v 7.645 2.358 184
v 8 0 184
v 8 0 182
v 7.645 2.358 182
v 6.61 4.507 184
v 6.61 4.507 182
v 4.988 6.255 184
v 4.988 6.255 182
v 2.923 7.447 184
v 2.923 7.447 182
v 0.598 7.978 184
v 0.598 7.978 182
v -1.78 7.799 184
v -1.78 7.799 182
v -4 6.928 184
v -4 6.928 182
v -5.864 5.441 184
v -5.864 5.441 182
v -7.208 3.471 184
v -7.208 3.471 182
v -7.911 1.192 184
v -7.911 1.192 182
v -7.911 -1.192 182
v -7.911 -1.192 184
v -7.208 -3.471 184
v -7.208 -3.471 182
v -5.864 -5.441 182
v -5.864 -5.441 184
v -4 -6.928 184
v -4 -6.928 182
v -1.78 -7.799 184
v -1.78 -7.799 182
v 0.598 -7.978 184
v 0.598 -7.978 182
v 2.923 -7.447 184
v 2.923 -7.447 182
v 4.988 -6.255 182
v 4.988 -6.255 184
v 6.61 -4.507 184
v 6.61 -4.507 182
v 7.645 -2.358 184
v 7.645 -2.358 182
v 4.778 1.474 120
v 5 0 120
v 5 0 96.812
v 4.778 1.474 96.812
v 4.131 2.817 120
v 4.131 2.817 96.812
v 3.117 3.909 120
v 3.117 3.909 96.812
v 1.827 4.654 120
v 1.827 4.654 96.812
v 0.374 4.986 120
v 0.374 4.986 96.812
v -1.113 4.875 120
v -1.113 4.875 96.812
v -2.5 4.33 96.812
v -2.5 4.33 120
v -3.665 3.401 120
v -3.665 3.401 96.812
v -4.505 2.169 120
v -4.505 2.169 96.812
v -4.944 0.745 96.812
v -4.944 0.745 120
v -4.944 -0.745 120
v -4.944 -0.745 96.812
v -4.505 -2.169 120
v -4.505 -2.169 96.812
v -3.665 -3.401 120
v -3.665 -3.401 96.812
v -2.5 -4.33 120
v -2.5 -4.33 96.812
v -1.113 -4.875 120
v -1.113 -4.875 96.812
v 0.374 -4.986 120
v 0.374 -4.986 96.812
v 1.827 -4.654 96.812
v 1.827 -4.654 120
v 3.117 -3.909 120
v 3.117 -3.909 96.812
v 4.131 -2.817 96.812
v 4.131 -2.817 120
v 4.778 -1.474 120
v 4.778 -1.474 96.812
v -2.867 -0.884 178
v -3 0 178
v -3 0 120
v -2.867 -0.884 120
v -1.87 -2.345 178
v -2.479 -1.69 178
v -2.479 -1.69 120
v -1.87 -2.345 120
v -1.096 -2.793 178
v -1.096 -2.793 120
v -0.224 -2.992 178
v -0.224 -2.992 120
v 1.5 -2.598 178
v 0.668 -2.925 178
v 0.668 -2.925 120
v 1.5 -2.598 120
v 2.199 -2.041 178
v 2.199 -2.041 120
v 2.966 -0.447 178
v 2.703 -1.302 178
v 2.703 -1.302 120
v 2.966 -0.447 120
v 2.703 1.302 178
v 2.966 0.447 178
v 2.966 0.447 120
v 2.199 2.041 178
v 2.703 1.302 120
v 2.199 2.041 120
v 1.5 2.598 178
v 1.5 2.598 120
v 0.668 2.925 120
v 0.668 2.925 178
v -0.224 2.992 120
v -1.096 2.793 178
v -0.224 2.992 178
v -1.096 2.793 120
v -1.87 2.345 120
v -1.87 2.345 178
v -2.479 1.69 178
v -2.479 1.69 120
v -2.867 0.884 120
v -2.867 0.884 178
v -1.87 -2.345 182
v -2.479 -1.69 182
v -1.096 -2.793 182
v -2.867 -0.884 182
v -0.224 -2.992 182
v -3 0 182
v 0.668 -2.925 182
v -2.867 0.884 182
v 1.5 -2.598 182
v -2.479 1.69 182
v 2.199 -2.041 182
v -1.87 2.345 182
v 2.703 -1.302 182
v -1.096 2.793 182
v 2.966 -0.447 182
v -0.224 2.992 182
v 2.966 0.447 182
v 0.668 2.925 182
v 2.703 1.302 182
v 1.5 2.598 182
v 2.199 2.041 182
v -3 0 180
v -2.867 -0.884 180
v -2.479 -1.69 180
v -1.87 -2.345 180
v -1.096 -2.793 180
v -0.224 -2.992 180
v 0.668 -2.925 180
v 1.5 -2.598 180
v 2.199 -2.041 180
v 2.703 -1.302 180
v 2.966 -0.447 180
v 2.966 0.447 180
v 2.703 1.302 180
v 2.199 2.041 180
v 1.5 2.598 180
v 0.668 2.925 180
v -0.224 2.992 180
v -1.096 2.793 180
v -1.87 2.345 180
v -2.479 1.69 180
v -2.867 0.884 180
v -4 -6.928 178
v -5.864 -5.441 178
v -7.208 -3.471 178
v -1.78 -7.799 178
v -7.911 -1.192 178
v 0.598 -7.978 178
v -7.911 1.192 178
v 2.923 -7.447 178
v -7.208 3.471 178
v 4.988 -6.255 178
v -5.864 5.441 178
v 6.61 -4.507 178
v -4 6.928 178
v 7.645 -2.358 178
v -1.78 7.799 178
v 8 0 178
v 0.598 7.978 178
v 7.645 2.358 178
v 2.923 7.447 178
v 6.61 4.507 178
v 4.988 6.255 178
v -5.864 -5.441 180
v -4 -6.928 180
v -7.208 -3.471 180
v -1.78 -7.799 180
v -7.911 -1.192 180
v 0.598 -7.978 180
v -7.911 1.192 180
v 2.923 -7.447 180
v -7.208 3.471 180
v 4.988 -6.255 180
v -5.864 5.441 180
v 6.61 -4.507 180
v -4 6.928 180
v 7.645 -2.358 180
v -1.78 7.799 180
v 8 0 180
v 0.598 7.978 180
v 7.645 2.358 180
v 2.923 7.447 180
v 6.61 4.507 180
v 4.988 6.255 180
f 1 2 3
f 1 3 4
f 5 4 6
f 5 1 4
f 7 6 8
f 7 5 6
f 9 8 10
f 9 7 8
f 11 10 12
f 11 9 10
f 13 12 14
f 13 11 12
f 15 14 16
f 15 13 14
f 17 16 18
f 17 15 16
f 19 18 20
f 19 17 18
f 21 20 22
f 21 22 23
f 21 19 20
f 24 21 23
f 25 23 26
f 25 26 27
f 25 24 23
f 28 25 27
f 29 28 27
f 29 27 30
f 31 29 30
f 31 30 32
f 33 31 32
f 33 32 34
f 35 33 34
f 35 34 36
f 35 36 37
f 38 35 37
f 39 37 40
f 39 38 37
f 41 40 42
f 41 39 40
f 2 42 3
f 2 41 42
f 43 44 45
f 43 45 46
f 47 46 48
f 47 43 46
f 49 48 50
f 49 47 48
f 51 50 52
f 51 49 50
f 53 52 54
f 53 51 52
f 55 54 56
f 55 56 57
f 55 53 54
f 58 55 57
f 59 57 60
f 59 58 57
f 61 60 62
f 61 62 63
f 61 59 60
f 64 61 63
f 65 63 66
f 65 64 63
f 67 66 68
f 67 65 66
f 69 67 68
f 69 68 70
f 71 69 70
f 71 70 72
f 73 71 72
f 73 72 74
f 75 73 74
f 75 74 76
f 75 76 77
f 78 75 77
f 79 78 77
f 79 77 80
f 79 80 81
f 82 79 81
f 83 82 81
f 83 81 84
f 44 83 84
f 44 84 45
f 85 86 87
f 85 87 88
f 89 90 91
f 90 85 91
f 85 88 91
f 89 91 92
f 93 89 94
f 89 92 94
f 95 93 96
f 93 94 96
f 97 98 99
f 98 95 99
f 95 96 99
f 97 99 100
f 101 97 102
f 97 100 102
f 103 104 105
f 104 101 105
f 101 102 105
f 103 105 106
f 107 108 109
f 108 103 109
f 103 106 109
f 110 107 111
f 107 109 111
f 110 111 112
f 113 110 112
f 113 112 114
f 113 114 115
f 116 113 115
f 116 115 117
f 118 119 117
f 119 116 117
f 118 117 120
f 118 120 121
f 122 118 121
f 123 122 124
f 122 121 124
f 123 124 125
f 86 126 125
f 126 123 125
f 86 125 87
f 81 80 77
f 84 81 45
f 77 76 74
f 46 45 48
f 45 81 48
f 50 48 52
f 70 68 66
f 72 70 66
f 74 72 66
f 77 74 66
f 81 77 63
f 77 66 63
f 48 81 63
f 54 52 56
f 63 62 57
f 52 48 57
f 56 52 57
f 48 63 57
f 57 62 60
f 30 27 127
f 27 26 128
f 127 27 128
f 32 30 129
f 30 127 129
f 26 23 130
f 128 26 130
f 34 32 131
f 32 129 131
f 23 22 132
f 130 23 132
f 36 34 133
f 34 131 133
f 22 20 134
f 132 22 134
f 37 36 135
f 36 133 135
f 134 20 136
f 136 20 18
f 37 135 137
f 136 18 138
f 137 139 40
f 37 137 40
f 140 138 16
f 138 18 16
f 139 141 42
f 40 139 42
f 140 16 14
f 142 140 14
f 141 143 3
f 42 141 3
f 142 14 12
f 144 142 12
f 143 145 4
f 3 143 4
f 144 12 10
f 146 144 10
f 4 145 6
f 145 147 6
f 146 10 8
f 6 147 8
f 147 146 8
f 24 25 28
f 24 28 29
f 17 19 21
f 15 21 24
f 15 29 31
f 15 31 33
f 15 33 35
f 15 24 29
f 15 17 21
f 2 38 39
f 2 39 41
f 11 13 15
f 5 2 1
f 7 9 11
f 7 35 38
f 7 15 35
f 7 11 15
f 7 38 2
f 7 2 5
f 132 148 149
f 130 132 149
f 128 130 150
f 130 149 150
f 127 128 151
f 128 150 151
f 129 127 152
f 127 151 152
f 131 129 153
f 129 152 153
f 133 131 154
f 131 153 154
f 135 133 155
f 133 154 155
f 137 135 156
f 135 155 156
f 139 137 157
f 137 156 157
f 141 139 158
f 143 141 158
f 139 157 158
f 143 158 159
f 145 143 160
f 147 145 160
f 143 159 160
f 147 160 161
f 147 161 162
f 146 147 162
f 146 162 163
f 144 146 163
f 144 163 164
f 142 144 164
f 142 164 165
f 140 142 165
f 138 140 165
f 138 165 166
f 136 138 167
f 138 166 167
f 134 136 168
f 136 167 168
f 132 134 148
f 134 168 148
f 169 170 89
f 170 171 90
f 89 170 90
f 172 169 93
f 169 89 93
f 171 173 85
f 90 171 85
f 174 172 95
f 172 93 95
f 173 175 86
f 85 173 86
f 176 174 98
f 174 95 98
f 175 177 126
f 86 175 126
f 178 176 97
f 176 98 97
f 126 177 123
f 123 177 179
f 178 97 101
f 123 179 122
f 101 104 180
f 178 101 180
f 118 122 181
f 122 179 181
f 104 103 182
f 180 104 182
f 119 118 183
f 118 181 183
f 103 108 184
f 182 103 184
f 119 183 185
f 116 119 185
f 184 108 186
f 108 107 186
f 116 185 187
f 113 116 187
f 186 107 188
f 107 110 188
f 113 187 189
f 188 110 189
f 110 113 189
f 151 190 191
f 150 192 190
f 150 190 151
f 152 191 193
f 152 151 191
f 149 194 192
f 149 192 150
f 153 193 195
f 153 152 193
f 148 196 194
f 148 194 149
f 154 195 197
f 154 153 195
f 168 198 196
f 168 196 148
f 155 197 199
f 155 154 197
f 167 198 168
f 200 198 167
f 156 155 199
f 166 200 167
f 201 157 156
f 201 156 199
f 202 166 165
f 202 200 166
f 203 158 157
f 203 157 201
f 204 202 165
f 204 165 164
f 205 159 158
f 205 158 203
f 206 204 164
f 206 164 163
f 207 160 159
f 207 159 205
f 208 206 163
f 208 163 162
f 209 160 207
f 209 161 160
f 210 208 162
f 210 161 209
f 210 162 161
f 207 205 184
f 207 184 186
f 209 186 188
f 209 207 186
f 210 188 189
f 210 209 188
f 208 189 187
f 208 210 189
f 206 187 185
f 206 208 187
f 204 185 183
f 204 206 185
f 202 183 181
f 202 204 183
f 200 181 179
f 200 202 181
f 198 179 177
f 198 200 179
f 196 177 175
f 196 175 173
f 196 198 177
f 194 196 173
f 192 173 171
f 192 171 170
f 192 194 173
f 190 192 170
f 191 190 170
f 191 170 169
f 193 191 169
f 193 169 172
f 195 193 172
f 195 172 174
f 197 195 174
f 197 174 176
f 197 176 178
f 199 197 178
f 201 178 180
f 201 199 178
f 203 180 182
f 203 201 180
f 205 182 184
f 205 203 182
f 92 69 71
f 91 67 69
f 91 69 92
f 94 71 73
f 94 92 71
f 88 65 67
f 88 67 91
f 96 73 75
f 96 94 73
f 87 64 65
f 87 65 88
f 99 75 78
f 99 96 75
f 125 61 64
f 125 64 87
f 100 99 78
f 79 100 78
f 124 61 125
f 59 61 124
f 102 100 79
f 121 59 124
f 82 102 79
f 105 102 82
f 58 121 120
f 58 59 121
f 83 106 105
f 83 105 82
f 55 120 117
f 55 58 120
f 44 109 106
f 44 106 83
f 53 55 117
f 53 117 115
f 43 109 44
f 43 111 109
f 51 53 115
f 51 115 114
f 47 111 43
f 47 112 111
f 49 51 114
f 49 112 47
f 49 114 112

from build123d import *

# Parameters (mm, degrees)
SKETCH_1_R               = 3
EXTRUDE_1_DEPTH          = 180
SKETCH_2_R               = 8
EXTRUDE_2_DEPTH          = 2
EXTRUDE_START            = -178
SKETCH_2_2_R             = 8
EXTRUDE_3_DEPTH          = 2
EXTRUDE_START_2          = -2
SKETCH_1_2_R             = 3
EXTRUDE_4_DEPTH          = 2
EXTRUDE_START_3          = 180
SKETCH_1_3_R             = 3
EXTRUDE_5_DEPTH          = 2
EXTRUDE_START_4          = 4
SKETCH_2_3_R             = 8
EXTRUDE_6_DEPTH          = 2
EXTRUDE_START_5          = -182
SKETCH_2_4_R             = 8
EXTRUDE_7_DEPTH          = 2
EXTRUDE_START_6          = -64
SKETCH_3_R               = 5
EXTRUDE_10_DEPTH         = 60
CUT_EXTRUDE_1_DEPTH      = 185.347497949
CUT_EXTRUDE_1_DEPTH_BACK = 185.347497949
SKETCH_4_W               = 115.941163498
SKETCH_4_H               = 45.19740272


with BuildPart() as part:
    # 草图1 → 凸台-拉伸1 (new body)
    with BuildSketch(Plane.XY):
        with Locations(Location((0, 0, 0), (0, 0, 180))):
            Circle(SKETCH_1_R)
    extrude(amount=EXTRUDE_1_DEPTH)

    # 草图2 → 凸台-拉伸2 (add)
    with BuildSketch(Plane.XY.offset(180)):
        Circle(SKETCH_2_R)
    extrude(amount=-EXTRUDE_2_DEPTH)

    # 草图2<2> → 凸台-拉伸3 (add)
    with BuildSketch(Plane.XY.offset(180).offset(EXTRUDE_START)):
        Circle(SKETCH_2_2_R)
    extrude(amount=-EXTRUDE_3_DEPTH)

    # 草图1<2> → 凸台-拉伸4 (add)
    with BuildSketch(Plane.XY.offset(EXTRUDE_START_2)):
        with Locations(Location((0, 0, 0), (0, 0, 180))):
            Circle(SKETCH_1_2_R)
    extrude(amount=EXTRUDE_4_DEPTH)

    # 草图1<3> → 凸台-拉伸5 (add)
    with BuildSketch(Plane.XY.offset(EXTRUDE_START_3)):
        with Locations(Location((0, 0, 0), (0, 0, 180))):
            Circle(SKETCH_1_3_R)
    extrude(amount=EXTRUDE_5_DEPTH)

    # 草图2<3> → 凸台-拉伸6 (add)
    with BuildSketch(Plane.XY.offset(180).offset(EXTRUDE_START_4)):
        Circle(SKETCH_2_3_R)
    extrude(amount=-EXTRUDE_6_DEPTH)

    # 草图2<4> → 凸台-拉伸7 (add)
    with BuildSketch(Plane.XY.offset(180).offset(EXTRUDE_START_5)):
        Circle(SKETCH_2_4_R)
    extrude(amount=-EXTRUDE_7_DEPTH)

    # 草图3 → 凸台-拉伸10 (add)
    with BuildSketch(Plane.XY.offset(184).offset(EXTRUDE_START_6)):
        Circle(SKETCH_3_R)
    extrude(amount=-EXTRUDE_10_DEPTH)

    # 草图4 → 切除-拉伸1 (cut, two sides: drawn at the far end of the back side and taken through both)
    with BuildSketch(Plane(origin=(0, 0, 0), x_dir=(0, 0, -1), z_dir=(1, 0, 0)).offset(-CUT_EXTRUDE_1_DEPTH_BACK)):
        with Locations((-38.8417804, 0.262013929)):
            Rectangle(SKETCH_4_W, SKETCH_4_H)
    extrude(amount=CUT_EXTRUDE_1_DEPTH + CUT_EXTRUDE_1_DEPTH_BACK, mode=Mode.SUBTRACT)


solid = part.part
